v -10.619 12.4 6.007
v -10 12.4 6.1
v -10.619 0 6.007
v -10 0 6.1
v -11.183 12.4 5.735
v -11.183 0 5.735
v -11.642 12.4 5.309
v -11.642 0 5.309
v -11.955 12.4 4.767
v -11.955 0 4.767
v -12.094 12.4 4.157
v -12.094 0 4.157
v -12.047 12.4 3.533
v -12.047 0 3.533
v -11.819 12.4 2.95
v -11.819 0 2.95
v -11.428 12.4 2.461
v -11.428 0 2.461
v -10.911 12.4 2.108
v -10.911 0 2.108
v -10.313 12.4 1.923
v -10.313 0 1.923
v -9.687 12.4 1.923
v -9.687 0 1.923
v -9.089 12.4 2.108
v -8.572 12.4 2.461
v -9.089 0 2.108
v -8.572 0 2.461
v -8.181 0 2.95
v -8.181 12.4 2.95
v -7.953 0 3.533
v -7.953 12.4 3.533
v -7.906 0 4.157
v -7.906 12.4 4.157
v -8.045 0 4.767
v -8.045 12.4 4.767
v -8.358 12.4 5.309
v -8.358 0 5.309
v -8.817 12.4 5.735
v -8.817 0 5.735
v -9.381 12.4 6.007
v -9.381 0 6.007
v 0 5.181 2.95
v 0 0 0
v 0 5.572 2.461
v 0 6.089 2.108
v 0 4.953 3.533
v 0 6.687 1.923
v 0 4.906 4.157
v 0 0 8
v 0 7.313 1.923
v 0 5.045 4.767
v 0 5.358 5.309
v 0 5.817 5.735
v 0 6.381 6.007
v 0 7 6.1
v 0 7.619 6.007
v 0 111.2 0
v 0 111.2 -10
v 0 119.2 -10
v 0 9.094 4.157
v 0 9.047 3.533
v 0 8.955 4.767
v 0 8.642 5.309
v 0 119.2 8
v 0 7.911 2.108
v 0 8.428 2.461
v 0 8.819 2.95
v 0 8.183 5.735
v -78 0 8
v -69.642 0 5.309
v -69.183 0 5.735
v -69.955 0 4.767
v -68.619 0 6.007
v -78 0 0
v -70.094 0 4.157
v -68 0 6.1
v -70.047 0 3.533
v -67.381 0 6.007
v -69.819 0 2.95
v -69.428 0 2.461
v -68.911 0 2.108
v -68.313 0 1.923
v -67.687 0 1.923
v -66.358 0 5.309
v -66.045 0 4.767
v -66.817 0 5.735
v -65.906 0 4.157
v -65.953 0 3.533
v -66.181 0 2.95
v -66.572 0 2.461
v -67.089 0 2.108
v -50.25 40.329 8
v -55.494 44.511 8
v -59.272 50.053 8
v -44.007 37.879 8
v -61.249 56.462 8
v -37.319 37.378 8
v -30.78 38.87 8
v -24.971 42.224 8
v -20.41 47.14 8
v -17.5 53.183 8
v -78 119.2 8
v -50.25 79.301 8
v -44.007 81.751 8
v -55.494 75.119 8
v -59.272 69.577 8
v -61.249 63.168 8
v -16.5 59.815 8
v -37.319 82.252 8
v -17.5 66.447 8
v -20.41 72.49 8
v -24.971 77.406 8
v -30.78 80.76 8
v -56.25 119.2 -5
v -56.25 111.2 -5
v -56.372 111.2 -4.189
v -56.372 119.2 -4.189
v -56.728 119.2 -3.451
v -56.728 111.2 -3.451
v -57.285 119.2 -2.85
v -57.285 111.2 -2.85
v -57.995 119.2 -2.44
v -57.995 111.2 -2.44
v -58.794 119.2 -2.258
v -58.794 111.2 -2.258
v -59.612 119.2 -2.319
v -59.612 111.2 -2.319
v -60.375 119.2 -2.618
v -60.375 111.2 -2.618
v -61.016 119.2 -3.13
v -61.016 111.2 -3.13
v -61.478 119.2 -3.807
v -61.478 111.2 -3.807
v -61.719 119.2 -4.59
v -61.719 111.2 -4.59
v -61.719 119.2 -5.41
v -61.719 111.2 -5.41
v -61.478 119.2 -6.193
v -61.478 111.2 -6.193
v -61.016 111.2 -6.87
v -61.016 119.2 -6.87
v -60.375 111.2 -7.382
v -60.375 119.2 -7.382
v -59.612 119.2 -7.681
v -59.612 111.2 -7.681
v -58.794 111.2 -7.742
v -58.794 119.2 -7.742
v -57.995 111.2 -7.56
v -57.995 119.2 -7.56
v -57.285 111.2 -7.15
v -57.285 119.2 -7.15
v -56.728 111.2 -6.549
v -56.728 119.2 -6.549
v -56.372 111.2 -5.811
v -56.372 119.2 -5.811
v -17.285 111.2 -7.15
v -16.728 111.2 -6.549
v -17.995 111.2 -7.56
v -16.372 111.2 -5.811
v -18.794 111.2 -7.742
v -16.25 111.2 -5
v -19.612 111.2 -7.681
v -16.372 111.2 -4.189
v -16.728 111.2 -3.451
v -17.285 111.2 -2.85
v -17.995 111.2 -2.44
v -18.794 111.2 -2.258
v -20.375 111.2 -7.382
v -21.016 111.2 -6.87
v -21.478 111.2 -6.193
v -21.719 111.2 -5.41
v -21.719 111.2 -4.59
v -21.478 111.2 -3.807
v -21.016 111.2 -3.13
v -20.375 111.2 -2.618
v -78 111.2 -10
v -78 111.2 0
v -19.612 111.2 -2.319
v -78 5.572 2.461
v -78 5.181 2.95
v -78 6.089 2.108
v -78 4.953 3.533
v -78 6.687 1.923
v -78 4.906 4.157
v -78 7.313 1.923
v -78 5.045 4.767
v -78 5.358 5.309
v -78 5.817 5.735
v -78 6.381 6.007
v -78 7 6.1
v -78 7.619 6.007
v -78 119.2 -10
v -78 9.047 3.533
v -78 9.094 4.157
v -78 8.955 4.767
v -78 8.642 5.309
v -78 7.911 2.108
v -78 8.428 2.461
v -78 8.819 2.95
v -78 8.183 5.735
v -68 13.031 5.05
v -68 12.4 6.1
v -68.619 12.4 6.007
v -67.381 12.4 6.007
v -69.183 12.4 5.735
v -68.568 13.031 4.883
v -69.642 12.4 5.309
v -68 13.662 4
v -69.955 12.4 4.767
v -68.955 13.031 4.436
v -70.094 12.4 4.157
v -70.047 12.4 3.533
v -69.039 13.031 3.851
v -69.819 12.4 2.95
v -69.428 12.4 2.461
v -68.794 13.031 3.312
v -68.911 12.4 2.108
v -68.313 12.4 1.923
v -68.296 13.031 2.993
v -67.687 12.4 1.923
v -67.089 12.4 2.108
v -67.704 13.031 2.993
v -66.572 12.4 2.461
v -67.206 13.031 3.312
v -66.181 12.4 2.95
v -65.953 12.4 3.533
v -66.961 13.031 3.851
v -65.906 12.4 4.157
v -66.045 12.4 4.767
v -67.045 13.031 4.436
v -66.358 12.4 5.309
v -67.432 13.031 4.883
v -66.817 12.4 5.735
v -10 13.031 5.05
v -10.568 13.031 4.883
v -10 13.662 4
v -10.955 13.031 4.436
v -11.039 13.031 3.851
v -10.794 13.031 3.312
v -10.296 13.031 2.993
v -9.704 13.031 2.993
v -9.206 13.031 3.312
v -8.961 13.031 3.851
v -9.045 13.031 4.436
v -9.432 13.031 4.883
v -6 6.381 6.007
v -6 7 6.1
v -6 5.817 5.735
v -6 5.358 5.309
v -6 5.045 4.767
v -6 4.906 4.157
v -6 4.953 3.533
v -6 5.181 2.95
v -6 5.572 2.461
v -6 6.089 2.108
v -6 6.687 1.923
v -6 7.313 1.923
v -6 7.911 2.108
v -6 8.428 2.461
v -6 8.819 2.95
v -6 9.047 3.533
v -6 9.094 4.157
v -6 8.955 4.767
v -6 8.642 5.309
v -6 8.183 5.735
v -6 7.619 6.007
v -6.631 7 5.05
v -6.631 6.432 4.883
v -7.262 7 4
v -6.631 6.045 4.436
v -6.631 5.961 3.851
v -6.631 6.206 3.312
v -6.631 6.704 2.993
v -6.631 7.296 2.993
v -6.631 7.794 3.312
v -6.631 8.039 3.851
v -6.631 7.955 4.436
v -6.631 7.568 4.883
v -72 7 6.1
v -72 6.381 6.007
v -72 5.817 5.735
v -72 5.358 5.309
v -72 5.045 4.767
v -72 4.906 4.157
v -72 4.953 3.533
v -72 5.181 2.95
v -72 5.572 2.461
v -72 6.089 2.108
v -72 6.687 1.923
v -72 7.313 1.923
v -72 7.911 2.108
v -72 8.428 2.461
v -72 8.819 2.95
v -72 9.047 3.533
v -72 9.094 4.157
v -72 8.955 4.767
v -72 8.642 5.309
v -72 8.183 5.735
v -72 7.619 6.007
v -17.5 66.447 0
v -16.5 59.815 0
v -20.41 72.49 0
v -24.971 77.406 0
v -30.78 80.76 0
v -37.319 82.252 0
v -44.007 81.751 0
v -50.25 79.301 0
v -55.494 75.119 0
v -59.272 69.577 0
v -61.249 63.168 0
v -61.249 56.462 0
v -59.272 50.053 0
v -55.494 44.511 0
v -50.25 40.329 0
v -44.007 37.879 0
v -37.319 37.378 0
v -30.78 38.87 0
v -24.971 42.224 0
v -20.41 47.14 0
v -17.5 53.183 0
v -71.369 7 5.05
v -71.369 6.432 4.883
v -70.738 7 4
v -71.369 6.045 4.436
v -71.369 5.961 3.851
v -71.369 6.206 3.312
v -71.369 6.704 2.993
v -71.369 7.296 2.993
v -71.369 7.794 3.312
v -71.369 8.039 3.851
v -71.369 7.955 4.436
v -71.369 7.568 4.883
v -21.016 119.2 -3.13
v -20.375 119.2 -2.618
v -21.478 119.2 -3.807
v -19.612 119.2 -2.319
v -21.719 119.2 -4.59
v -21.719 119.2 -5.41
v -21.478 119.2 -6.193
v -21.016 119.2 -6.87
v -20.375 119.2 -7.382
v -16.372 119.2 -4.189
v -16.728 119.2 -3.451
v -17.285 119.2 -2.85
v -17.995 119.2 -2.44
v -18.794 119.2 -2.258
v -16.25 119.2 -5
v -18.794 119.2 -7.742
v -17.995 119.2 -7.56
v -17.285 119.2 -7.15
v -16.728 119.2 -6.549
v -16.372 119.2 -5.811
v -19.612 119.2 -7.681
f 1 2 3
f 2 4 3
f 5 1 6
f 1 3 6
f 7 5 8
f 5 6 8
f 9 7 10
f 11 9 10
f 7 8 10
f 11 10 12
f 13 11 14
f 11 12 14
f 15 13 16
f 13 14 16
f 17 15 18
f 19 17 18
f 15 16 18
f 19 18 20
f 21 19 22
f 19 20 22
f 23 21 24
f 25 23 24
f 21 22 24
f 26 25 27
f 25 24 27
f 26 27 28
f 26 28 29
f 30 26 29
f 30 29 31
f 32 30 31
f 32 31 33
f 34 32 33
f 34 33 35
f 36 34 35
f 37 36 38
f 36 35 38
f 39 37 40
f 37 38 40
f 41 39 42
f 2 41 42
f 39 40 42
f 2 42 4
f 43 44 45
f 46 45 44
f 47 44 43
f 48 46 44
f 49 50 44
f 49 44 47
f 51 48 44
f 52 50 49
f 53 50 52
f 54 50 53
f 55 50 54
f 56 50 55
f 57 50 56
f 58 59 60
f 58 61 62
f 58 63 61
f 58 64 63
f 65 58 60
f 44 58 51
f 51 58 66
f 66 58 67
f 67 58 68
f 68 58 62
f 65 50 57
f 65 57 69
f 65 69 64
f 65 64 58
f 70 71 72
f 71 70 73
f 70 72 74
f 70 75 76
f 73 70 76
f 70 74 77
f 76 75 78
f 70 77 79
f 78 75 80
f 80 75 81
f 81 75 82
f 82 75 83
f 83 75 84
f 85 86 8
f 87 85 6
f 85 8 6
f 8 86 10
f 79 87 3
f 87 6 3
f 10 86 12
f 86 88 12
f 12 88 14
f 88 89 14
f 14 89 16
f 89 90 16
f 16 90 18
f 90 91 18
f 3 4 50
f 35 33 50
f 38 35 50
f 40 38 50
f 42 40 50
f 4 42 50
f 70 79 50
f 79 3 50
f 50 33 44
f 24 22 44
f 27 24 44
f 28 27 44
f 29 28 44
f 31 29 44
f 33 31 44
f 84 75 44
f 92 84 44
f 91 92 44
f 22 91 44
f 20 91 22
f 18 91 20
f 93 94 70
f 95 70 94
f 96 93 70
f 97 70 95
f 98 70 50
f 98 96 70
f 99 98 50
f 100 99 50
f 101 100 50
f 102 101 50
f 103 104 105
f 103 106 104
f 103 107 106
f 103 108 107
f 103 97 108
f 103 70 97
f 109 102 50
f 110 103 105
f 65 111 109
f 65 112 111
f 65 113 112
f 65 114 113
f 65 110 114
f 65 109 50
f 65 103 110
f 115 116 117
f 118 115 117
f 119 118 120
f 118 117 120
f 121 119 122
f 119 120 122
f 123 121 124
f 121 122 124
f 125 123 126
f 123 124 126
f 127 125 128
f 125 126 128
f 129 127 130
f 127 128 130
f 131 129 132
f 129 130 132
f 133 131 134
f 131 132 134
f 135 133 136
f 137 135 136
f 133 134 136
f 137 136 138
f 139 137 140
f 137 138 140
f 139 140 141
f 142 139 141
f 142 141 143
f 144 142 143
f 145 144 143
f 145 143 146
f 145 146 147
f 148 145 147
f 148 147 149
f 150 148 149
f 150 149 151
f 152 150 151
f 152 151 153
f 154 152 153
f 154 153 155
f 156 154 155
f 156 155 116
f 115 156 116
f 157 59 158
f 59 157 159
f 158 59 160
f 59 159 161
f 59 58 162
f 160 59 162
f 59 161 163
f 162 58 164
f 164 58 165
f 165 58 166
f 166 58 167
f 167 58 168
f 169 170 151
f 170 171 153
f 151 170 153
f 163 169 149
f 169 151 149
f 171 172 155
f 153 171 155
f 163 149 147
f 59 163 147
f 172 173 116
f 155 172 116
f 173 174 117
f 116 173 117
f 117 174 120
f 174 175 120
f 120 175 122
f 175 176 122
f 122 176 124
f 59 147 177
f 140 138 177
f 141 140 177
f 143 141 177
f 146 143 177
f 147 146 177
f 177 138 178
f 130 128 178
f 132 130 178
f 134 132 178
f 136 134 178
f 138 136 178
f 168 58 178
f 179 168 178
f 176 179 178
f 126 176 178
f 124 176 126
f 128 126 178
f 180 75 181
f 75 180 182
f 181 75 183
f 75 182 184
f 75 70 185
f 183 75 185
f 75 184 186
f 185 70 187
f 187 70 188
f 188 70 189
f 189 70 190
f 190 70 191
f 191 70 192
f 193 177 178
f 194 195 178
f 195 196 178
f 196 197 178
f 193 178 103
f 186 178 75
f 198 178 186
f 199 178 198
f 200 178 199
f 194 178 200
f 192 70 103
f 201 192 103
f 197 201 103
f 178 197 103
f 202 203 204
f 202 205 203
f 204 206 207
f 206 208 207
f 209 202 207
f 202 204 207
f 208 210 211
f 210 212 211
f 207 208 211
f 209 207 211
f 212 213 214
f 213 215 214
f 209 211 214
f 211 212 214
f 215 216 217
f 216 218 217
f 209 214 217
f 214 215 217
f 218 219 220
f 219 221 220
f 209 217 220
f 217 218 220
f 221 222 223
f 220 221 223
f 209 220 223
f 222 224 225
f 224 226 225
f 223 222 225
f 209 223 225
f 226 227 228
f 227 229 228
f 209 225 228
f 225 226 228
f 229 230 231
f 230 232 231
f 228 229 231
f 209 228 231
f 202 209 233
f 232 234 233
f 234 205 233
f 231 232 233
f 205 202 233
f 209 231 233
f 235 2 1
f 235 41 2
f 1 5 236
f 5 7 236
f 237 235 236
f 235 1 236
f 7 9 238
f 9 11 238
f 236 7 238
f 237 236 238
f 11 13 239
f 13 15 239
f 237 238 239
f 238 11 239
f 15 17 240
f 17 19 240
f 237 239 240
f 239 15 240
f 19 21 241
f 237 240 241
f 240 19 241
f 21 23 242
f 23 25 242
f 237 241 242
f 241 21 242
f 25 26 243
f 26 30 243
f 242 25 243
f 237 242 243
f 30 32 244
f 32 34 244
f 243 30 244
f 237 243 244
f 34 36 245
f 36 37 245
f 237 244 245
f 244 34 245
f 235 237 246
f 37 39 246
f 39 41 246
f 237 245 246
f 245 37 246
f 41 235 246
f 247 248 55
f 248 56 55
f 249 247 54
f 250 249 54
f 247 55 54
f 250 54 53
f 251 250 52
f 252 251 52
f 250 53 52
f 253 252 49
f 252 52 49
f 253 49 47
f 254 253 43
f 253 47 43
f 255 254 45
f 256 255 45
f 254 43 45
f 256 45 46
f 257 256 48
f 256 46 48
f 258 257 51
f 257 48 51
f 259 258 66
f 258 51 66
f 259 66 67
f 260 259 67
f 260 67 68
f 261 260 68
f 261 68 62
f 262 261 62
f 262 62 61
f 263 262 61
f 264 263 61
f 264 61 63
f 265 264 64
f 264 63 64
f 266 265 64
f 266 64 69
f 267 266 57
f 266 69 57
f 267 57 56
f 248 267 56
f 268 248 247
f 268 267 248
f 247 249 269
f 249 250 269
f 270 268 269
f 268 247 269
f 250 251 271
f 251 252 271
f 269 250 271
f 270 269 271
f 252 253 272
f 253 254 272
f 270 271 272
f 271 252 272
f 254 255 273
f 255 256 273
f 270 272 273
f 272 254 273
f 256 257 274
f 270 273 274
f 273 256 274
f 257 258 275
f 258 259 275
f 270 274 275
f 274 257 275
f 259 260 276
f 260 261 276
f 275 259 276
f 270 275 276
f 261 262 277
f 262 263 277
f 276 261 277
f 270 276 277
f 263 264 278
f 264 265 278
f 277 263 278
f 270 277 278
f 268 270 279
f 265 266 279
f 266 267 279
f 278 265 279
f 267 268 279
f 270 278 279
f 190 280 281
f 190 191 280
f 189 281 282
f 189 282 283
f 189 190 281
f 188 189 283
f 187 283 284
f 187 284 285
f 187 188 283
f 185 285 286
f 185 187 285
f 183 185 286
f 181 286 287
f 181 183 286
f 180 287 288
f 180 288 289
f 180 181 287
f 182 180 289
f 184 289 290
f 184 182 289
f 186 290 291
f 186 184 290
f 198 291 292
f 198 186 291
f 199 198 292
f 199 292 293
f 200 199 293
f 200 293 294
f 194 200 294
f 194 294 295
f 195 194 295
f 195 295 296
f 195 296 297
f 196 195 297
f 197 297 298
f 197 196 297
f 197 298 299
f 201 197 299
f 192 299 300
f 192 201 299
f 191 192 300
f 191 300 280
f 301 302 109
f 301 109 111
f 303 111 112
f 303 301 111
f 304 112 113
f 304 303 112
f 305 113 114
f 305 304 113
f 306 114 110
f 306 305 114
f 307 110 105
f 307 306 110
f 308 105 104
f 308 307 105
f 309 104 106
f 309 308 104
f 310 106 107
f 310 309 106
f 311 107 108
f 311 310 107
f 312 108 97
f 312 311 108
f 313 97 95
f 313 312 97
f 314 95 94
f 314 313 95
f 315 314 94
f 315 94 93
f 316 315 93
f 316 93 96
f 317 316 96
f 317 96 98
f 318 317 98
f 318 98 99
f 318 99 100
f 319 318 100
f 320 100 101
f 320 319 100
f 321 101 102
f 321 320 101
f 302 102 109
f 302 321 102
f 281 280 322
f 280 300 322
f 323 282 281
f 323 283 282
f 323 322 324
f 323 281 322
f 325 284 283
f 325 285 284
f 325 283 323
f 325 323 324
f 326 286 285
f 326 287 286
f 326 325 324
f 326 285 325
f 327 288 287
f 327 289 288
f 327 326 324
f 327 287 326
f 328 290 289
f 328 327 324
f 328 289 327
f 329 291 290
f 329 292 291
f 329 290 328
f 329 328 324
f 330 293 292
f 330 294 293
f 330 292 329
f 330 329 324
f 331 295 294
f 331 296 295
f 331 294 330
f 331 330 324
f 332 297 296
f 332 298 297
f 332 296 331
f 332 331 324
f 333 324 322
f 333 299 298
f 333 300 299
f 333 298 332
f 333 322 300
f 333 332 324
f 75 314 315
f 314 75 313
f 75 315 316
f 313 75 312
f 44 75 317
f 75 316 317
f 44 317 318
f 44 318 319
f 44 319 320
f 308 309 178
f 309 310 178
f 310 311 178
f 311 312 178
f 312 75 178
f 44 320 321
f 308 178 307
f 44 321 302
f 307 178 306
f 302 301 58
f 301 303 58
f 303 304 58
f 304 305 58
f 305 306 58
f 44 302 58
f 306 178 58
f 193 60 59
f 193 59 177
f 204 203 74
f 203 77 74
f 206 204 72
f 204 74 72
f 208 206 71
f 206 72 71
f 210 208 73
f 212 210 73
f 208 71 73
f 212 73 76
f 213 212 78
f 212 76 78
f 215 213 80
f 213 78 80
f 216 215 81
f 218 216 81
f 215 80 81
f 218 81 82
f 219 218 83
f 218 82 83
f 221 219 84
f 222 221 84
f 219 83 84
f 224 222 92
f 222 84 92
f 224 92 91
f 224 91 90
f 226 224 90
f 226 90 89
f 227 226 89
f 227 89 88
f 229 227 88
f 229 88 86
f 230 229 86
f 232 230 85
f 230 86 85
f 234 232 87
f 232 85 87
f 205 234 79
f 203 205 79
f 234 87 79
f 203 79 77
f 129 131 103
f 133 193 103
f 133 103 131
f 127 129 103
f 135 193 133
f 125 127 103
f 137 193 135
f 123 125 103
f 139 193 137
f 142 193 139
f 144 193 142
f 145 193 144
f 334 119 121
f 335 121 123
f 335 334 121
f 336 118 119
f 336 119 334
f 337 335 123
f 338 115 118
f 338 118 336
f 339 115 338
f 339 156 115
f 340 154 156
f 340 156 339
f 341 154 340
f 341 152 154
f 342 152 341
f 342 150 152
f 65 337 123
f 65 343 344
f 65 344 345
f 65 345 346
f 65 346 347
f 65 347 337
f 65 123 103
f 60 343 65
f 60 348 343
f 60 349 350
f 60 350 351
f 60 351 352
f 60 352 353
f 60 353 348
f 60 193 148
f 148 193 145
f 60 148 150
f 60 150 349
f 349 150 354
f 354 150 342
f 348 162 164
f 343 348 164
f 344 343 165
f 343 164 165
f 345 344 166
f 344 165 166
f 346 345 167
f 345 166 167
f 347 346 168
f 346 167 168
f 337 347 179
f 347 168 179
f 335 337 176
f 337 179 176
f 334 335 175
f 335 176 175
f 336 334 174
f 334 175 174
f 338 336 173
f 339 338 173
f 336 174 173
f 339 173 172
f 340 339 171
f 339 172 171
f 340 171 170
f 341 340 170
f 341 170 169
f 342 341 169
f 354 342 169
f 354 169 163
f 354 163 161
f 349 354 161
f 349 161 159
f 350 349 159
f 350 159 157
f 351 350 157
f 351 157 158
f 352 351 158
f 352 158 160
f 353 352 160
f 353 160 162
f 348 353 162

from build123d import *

# Parameters (mm, degrees)
SKETCH_1_W                  = 78
SKETCH_1_H                  = 119.63
SKETCH_1_R                  = 22.5
EXTRUDE_1_DEPTH             = 8
HOLE_WIZARD_M5_1_AT_2_COUNT = 2
HOLE_WIZARD_M5_1_AT_2_PITCH = 58
SKETCH_4_W                  = 78
SKETCH_4_H                  = 23.52391086
EXTRUDE_2_DEPTH             = 8
SKETCH_5_W                  = 78
SKETCH_5_H                  = 8.43
EXTRUDE_3_DEPTH             = 10
SKETCH_6_W                  = 78
SKETCH_6_H                  = 18
CUT_EXTRUDE_1_DEPTH         = 0.43
SKETCH_7_R                  = 2.75
CUT_EXTRUDE_2_DEPTH         = 9
HOLE_WIZARD_M5_2_AT_2_COUNT = 2
HOLE_WIZARD_M5_2_AT_2_PITCH = 90


with BuildPart() as part:
    # 草图1 → 凸台-拉伸1 (new body)
    with BuildSketch(Plane.XY):
        with Locations((-39, 59.815)):
            Rectangle(SKETCH_1_W, SKETCH_1_H)
        with Locations((-39, 59.815)):
            Circle(SKETCH_1_R, mode=Mode.SUBTRACT)
    extrude(amount=EXTRUDE_1_DEPTH)

    # 草图3 → M5 螺纹孔1 (revolve, cut)
    with BuildSketch(Plane(origin=(-68, 119.63, 4), x_dir=(0, 0, 1), z_dir=(1, 0, 0))):
        Polygon((0, 0), (0, 13.6618073), (2.1, 12.4), (2.1, 0), align=None)
    hole_wizard_m5_1 = revolve(axis=Axis((-68, 125.98, 4), (0, -1, 0)), mode=Mode.SUBTRACT)

    # M5 螺纹孔1 at 2: M5 螺纹孔1 ×2
    with Locations(*[(i * HOLE_WIZARD_M5_1_AT_2_PITCH, 0, 0) for i in range(1, HOLE_WIZARD_M5_1_AT_2_COUNT)]):
        add(hole_wizard_m5_1, mode=Mode.SUBTRACT)

    # 镜向1: M5 螺纹孔1 across plane
    add(hole_wizard_m5_1.mirror(Plane.ZX.offset(59.815)), mode=Mode.SUBTRACT)

    # 镜向1 copy 1 sketch → 镜向1 copy 1 (revolve, cut)
    with BuildSketch(Plane(origin=(-10, 0, 4), x_dir=(0, 0, 1), z_dir=(1, 0, 0))):
        Polygon((0, 0), (0, -13.6618073), (2.1, -12.4), (2.1, 0), align=None)
    revolve(axis=Axis((-10, -6.35, 4), (0, -1, 0)), mode=Mode.SUBTRACT)

    # 草图4 → 凸台-拉伸2 (add)
    with BuildSketch(Plane.XY.offset(8)):
        with Locations((-39, 107.86804457)):
            Rectangle(SKETCH_4_W, SKETCH_4_H)
    extrude(amount=-EXTRUDE_2_DEPTH)

    # 草图5 → 凸台-拉伸3 (add)
    with BuildSketch(Plane(origin=(0, 0, 0), x_dir=(-1, 0, 0), z_dir=(0, 0, -1))):
        with Locations((39, 115.415)):
            Rectangle(SKETCH_5_W, SKETCH_5_H)
    extrude(amount=EXTRUDE_3_DEPTH)

    # 草图6 → 切除-拉伸1 (cut)
    with BuildSketch(Plane(origin=(0, 119.63, 0), x_dir=(1, 0, 0), z_dir=(0, 1, 0))):
        with Locations((-39, 1)):
            Rectangle(SKETCH_6_W, SKETCH_6_H)
    extrude(amount=-CUT_EXTRUDE_1_DEPTH, mode=Mode.SUBTRACT)

    # 草图7 → 切除-拉伸2 (cut, through all)
    with BuildSketch(Plane.XZ.offset(-111.2)):
        with Locations((-59, -5)):
            Circle(SKETCH_7_R)
        with Locations((-19, -5)):
            Circle(SKETCH_7_R)
    extrude(amount=-CUT_EXTRUDE_2_DEPTH, mode=Mode.SUBTRACT)

    # 草图9 → M5 螺纹孔2 (revolve, cut)
    with BuildSketch(Plane(origin=(-78, 7, 4), x_dir=(0, 0, 1), z_dir=(0, 1, 0))):
        Polygon((0, 0), (0, 7.2618073), (2.1, 6), (2.1, 0), align=None)
    hole_wizard_m5_2 = revolve(axis=Axis((-84.35, 7, 4), (1, 0, 0)), mode=Mode.SUBTRACT)

    # M5 螺纹孔2 at 2: M5 螺纹孔2 ×2
    with Locations(*[(0, 0, -i * HOLE_WIZARD_M5_2_AT_2_PITCH) for i in range(1, HOLE_WIZARD_M5_2_AT_2_COUNT)]):
        add(hole_wizard_m5_2, mode=Mode.SUBTRACT)

    # 镜向2: M5 螺纹孔2 across plane
    add(hole_wizard_m5_2.mirror(Plane(origin=(-39, 0, 0), x_dir=(0, 0, 1), z_dir=(1, 0, 0))), mode=Mode.SUBTRACT)

    # 镜向2 copy 1 sketch → 镜向2 copy 1 (revolve, cut)
    with BuildSketch(Plane(origin=(0, 7, -86), x_dir=(0, 0, 1), z_dir=(0, 1, 0))):
        Polygon((0, 0), (0, -7.2618073), (2.1, -6), (2.1, 0), align=None)
    revolve(axis=Axis((6.35, 7, -86), (1, 0, 0)), mode=Mode.SUBTRACT)


solid = part.part
